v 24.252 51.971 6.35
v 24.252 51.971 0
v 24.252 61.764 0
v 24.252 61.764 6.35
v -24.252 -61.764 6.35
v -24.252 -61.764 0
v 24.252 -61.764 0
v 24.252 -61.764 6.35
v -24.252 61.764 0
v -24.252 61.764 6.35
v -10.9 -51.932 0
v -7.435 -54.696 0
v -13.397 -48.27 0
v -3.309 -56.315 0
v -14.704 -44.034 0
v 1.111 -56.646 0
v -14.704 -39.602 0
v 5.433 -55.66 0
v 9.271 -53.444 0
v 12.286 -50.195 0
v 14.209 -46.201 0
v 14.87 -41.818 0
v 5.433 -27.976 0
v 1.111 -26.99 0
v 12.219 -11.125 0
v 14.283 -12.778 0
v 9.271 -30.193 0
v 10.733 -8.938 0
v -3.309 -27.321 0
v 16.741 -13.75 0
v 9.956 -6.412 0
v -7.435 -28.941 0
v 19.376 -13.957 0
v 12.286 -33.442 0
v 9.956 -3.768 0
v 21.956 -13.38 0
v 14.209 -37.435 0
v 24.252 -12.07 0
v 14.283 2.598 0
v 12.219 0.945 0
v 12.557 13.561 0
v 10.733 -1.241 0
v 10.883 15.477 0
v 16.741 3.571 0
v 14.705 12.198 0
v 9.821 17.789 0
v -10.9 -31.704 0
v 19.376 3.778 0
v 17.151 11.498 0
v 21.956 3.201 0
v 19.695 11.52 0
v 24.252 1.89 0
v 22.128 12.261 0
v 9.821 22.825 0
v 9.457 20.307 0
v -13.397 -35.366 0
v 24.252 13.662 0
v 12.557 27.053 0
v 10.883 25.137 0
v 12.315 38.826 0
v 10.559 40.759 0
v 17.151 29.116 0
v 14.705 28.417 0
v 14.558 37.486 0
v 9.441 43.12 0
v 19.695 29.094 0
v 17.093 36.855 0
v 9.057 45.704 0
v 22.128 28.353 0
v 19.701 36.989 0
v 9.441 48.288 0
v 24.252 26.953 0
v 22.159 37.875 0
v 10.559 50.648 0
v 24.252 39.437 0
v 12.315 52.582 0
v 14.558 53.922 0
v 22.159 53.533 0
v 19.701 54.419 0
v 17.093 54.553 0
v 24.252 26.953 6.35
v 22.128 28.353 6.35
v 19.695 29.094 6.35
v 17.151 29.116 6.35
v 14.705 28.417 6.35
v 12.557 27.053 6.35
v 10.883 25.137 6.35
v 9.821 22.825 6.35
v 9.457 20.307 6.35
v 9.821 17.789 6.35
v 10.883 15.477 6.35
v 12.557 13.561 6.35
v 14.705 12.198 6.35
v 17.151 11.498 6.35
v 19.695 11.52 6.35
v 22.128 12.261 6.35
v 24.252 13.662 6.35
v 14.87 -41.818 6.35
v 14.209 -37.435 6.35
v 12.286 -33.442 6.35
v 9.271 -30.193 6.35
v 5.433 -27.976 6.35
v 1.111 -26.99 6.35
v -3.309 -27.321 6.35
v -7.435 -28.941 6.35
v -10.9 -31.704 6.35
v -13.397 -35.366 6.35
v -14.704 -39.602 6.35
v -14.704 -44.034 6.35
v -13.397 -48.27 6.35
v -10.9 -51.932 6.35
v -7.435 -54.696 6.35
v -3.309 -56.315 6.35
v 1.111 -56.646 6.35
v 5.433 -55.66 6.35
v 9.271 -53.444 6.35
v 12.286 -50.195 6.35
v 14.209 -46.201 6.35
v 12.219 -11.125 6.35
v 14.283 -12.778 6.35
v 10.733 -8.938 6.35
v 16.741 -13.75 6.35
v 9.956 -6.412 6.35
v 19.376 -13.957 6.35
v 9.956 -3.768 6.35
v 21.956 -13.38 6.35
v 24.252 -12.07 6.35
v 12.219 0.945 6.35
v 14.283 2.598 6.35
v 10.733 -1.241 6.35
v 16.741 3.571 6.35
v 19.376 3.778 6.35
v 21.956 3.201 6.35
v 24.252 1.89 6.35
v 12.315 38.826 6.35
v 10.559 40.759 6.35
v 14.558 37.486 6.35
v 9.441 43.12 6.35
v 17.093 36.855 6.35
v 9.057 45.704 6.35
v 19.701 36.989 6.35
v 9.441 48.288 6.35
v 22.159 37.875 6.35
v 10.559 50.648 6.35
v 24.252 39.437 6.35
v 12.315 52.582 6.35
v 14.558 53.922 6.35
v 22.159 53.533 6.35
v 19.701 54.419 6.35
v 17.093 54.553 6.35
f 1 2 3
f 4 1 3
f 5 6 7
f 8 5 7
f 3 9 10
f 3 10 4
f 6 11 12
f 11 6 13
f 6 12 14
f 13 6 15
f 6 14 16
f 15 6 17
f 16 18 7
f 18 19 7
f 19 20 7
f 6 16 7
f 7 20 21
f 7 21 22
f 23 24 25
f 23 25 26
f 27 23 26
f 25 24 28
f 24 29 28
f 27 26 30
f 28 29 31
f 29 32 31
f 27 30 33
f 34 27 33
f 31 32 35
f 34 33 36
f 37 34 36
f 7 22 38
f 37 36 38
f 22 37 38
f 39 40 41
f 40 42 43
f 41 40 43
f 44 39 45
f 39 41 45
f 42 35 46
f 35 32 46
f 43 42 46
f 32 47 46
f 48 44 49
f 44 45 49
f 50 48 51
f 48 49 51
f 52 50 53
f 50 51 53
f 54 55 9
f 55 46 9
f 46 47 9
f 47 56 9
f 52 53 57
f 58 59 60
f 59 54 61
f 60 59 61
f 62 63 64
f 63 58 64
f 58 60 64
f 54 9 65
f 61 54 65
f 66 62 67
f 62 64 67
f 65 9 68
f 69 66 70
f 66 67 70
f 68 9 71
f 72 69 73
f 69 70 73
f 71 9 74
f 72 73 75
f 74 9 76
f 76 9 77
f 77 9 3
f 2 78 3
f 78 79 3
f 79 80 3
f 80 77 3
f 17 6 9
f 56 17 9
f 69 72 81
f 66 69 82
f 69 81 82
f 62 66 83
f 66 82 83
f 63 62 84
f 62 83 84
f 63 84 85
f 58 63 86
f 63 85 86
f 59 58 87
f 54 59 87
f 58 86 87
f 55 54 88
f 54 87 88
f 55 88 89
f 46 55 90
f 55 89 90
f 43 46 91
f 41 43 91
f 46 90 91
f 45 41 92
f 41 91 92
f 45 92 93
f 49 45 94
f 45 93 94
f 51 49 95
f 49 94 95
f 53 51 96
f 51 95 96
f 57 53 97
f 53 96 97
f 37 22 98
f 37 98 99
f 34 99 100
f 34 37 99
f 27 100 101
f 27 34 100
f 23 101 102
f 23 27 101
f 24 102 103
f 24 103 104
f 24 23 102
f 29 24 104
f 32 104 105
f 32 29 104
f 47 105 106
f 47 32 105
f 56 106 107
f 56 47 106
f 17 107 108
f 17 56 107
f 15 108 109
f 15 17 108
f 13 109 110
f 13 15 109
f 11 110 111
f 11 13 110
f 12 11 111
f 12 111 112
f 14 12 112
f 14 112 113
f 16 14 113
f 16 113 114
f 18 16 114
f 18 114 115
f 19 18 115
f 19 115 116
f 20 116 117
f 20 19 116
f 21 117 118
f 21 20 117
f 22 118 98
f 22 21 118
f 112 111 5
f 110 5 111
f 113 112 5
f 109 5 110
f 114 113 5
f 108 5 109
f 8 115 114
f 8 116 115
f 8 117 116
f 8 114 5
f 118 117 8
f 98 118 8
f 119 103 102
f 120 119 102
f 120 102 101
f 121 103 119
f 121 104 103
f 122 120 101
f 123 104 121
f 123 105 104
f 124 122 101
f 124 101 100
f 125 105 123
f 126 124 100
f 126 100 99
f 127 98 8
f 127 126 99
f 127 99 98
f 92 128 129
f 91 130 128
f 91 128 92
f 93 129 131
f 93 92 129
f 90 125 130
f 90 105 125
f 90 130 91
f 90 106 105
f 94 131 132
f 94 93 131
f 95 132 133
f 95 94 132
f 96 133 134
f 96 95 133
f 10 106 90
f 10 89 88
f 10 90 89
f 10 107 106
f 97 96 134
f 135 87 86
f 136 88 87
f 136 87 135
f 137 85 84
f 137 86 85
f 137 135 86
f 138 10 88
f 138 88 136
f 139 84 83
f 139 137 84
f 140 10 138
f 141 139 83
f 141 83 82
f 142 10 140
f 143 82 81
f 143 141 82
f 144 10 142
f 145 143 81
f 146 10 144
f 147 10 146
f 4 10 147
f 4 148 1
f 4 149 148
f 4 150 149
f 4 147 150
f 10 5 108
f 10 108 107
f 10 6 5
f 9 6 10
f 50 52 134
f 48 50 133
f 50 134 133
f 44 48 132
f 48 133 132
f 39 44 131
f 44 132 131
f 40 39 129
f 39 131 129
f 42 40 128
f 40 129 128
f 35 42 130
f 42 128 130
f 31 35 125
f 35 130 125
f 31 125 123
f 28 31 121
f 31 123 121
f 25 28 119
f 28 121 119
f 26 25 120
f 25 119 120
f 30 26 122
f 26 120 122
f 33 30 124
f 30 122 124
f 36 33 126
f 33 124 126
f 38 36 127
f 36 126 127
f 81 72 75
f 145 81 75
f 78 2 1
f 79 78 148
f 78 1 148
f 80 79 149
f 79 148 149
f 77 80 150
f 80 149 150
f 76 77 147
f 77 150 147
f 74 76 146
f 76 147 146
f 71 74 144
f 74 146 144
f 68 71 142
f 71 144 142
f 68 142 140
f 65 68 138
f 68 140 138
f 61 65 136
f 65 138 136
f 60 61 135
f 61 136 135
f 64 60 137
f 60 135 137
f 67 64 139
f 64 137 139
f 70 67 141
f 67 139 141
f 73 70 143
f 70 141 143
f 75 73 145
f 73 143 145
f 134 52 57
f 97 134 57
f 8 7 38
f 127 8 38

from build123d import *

# Parameters (mm, degrees)
F0_W     = 48.50465
F0_H     = 123.528182
F0_R     = 14.869819
F1_DEPTH = 6.35
F2_R     = 8.89
F3_DEPTH = 6.351


with BuildPart() as f1:
    # F0 (on Top) → F1 (new body)
    with BuildSketch(Plane.XY):
        Rectangle(F0_W, F0_H)
        with Locations((0, -41.818257)):
            Circle(F0_R, mode=Mode.SUBTRACT)
    extrude(amount=F1_DEPTH)

    # F2 (on face) → F3 (cut, through all)
    with BuildSketch(Plane.XY.offset(6.35)):
        with Locations((17.947458, 45.703962)):
            Circle(F2_R)
        with Locations((18.347179, 20.307108)):
            Circle(F2_R)
        with Locations((18.7469, -5.089747)):
            Circle(F2_R)
    extrude(amount=-F3_DEPTH, mode=Mode.SUBTRACT)


solid = f1.part
